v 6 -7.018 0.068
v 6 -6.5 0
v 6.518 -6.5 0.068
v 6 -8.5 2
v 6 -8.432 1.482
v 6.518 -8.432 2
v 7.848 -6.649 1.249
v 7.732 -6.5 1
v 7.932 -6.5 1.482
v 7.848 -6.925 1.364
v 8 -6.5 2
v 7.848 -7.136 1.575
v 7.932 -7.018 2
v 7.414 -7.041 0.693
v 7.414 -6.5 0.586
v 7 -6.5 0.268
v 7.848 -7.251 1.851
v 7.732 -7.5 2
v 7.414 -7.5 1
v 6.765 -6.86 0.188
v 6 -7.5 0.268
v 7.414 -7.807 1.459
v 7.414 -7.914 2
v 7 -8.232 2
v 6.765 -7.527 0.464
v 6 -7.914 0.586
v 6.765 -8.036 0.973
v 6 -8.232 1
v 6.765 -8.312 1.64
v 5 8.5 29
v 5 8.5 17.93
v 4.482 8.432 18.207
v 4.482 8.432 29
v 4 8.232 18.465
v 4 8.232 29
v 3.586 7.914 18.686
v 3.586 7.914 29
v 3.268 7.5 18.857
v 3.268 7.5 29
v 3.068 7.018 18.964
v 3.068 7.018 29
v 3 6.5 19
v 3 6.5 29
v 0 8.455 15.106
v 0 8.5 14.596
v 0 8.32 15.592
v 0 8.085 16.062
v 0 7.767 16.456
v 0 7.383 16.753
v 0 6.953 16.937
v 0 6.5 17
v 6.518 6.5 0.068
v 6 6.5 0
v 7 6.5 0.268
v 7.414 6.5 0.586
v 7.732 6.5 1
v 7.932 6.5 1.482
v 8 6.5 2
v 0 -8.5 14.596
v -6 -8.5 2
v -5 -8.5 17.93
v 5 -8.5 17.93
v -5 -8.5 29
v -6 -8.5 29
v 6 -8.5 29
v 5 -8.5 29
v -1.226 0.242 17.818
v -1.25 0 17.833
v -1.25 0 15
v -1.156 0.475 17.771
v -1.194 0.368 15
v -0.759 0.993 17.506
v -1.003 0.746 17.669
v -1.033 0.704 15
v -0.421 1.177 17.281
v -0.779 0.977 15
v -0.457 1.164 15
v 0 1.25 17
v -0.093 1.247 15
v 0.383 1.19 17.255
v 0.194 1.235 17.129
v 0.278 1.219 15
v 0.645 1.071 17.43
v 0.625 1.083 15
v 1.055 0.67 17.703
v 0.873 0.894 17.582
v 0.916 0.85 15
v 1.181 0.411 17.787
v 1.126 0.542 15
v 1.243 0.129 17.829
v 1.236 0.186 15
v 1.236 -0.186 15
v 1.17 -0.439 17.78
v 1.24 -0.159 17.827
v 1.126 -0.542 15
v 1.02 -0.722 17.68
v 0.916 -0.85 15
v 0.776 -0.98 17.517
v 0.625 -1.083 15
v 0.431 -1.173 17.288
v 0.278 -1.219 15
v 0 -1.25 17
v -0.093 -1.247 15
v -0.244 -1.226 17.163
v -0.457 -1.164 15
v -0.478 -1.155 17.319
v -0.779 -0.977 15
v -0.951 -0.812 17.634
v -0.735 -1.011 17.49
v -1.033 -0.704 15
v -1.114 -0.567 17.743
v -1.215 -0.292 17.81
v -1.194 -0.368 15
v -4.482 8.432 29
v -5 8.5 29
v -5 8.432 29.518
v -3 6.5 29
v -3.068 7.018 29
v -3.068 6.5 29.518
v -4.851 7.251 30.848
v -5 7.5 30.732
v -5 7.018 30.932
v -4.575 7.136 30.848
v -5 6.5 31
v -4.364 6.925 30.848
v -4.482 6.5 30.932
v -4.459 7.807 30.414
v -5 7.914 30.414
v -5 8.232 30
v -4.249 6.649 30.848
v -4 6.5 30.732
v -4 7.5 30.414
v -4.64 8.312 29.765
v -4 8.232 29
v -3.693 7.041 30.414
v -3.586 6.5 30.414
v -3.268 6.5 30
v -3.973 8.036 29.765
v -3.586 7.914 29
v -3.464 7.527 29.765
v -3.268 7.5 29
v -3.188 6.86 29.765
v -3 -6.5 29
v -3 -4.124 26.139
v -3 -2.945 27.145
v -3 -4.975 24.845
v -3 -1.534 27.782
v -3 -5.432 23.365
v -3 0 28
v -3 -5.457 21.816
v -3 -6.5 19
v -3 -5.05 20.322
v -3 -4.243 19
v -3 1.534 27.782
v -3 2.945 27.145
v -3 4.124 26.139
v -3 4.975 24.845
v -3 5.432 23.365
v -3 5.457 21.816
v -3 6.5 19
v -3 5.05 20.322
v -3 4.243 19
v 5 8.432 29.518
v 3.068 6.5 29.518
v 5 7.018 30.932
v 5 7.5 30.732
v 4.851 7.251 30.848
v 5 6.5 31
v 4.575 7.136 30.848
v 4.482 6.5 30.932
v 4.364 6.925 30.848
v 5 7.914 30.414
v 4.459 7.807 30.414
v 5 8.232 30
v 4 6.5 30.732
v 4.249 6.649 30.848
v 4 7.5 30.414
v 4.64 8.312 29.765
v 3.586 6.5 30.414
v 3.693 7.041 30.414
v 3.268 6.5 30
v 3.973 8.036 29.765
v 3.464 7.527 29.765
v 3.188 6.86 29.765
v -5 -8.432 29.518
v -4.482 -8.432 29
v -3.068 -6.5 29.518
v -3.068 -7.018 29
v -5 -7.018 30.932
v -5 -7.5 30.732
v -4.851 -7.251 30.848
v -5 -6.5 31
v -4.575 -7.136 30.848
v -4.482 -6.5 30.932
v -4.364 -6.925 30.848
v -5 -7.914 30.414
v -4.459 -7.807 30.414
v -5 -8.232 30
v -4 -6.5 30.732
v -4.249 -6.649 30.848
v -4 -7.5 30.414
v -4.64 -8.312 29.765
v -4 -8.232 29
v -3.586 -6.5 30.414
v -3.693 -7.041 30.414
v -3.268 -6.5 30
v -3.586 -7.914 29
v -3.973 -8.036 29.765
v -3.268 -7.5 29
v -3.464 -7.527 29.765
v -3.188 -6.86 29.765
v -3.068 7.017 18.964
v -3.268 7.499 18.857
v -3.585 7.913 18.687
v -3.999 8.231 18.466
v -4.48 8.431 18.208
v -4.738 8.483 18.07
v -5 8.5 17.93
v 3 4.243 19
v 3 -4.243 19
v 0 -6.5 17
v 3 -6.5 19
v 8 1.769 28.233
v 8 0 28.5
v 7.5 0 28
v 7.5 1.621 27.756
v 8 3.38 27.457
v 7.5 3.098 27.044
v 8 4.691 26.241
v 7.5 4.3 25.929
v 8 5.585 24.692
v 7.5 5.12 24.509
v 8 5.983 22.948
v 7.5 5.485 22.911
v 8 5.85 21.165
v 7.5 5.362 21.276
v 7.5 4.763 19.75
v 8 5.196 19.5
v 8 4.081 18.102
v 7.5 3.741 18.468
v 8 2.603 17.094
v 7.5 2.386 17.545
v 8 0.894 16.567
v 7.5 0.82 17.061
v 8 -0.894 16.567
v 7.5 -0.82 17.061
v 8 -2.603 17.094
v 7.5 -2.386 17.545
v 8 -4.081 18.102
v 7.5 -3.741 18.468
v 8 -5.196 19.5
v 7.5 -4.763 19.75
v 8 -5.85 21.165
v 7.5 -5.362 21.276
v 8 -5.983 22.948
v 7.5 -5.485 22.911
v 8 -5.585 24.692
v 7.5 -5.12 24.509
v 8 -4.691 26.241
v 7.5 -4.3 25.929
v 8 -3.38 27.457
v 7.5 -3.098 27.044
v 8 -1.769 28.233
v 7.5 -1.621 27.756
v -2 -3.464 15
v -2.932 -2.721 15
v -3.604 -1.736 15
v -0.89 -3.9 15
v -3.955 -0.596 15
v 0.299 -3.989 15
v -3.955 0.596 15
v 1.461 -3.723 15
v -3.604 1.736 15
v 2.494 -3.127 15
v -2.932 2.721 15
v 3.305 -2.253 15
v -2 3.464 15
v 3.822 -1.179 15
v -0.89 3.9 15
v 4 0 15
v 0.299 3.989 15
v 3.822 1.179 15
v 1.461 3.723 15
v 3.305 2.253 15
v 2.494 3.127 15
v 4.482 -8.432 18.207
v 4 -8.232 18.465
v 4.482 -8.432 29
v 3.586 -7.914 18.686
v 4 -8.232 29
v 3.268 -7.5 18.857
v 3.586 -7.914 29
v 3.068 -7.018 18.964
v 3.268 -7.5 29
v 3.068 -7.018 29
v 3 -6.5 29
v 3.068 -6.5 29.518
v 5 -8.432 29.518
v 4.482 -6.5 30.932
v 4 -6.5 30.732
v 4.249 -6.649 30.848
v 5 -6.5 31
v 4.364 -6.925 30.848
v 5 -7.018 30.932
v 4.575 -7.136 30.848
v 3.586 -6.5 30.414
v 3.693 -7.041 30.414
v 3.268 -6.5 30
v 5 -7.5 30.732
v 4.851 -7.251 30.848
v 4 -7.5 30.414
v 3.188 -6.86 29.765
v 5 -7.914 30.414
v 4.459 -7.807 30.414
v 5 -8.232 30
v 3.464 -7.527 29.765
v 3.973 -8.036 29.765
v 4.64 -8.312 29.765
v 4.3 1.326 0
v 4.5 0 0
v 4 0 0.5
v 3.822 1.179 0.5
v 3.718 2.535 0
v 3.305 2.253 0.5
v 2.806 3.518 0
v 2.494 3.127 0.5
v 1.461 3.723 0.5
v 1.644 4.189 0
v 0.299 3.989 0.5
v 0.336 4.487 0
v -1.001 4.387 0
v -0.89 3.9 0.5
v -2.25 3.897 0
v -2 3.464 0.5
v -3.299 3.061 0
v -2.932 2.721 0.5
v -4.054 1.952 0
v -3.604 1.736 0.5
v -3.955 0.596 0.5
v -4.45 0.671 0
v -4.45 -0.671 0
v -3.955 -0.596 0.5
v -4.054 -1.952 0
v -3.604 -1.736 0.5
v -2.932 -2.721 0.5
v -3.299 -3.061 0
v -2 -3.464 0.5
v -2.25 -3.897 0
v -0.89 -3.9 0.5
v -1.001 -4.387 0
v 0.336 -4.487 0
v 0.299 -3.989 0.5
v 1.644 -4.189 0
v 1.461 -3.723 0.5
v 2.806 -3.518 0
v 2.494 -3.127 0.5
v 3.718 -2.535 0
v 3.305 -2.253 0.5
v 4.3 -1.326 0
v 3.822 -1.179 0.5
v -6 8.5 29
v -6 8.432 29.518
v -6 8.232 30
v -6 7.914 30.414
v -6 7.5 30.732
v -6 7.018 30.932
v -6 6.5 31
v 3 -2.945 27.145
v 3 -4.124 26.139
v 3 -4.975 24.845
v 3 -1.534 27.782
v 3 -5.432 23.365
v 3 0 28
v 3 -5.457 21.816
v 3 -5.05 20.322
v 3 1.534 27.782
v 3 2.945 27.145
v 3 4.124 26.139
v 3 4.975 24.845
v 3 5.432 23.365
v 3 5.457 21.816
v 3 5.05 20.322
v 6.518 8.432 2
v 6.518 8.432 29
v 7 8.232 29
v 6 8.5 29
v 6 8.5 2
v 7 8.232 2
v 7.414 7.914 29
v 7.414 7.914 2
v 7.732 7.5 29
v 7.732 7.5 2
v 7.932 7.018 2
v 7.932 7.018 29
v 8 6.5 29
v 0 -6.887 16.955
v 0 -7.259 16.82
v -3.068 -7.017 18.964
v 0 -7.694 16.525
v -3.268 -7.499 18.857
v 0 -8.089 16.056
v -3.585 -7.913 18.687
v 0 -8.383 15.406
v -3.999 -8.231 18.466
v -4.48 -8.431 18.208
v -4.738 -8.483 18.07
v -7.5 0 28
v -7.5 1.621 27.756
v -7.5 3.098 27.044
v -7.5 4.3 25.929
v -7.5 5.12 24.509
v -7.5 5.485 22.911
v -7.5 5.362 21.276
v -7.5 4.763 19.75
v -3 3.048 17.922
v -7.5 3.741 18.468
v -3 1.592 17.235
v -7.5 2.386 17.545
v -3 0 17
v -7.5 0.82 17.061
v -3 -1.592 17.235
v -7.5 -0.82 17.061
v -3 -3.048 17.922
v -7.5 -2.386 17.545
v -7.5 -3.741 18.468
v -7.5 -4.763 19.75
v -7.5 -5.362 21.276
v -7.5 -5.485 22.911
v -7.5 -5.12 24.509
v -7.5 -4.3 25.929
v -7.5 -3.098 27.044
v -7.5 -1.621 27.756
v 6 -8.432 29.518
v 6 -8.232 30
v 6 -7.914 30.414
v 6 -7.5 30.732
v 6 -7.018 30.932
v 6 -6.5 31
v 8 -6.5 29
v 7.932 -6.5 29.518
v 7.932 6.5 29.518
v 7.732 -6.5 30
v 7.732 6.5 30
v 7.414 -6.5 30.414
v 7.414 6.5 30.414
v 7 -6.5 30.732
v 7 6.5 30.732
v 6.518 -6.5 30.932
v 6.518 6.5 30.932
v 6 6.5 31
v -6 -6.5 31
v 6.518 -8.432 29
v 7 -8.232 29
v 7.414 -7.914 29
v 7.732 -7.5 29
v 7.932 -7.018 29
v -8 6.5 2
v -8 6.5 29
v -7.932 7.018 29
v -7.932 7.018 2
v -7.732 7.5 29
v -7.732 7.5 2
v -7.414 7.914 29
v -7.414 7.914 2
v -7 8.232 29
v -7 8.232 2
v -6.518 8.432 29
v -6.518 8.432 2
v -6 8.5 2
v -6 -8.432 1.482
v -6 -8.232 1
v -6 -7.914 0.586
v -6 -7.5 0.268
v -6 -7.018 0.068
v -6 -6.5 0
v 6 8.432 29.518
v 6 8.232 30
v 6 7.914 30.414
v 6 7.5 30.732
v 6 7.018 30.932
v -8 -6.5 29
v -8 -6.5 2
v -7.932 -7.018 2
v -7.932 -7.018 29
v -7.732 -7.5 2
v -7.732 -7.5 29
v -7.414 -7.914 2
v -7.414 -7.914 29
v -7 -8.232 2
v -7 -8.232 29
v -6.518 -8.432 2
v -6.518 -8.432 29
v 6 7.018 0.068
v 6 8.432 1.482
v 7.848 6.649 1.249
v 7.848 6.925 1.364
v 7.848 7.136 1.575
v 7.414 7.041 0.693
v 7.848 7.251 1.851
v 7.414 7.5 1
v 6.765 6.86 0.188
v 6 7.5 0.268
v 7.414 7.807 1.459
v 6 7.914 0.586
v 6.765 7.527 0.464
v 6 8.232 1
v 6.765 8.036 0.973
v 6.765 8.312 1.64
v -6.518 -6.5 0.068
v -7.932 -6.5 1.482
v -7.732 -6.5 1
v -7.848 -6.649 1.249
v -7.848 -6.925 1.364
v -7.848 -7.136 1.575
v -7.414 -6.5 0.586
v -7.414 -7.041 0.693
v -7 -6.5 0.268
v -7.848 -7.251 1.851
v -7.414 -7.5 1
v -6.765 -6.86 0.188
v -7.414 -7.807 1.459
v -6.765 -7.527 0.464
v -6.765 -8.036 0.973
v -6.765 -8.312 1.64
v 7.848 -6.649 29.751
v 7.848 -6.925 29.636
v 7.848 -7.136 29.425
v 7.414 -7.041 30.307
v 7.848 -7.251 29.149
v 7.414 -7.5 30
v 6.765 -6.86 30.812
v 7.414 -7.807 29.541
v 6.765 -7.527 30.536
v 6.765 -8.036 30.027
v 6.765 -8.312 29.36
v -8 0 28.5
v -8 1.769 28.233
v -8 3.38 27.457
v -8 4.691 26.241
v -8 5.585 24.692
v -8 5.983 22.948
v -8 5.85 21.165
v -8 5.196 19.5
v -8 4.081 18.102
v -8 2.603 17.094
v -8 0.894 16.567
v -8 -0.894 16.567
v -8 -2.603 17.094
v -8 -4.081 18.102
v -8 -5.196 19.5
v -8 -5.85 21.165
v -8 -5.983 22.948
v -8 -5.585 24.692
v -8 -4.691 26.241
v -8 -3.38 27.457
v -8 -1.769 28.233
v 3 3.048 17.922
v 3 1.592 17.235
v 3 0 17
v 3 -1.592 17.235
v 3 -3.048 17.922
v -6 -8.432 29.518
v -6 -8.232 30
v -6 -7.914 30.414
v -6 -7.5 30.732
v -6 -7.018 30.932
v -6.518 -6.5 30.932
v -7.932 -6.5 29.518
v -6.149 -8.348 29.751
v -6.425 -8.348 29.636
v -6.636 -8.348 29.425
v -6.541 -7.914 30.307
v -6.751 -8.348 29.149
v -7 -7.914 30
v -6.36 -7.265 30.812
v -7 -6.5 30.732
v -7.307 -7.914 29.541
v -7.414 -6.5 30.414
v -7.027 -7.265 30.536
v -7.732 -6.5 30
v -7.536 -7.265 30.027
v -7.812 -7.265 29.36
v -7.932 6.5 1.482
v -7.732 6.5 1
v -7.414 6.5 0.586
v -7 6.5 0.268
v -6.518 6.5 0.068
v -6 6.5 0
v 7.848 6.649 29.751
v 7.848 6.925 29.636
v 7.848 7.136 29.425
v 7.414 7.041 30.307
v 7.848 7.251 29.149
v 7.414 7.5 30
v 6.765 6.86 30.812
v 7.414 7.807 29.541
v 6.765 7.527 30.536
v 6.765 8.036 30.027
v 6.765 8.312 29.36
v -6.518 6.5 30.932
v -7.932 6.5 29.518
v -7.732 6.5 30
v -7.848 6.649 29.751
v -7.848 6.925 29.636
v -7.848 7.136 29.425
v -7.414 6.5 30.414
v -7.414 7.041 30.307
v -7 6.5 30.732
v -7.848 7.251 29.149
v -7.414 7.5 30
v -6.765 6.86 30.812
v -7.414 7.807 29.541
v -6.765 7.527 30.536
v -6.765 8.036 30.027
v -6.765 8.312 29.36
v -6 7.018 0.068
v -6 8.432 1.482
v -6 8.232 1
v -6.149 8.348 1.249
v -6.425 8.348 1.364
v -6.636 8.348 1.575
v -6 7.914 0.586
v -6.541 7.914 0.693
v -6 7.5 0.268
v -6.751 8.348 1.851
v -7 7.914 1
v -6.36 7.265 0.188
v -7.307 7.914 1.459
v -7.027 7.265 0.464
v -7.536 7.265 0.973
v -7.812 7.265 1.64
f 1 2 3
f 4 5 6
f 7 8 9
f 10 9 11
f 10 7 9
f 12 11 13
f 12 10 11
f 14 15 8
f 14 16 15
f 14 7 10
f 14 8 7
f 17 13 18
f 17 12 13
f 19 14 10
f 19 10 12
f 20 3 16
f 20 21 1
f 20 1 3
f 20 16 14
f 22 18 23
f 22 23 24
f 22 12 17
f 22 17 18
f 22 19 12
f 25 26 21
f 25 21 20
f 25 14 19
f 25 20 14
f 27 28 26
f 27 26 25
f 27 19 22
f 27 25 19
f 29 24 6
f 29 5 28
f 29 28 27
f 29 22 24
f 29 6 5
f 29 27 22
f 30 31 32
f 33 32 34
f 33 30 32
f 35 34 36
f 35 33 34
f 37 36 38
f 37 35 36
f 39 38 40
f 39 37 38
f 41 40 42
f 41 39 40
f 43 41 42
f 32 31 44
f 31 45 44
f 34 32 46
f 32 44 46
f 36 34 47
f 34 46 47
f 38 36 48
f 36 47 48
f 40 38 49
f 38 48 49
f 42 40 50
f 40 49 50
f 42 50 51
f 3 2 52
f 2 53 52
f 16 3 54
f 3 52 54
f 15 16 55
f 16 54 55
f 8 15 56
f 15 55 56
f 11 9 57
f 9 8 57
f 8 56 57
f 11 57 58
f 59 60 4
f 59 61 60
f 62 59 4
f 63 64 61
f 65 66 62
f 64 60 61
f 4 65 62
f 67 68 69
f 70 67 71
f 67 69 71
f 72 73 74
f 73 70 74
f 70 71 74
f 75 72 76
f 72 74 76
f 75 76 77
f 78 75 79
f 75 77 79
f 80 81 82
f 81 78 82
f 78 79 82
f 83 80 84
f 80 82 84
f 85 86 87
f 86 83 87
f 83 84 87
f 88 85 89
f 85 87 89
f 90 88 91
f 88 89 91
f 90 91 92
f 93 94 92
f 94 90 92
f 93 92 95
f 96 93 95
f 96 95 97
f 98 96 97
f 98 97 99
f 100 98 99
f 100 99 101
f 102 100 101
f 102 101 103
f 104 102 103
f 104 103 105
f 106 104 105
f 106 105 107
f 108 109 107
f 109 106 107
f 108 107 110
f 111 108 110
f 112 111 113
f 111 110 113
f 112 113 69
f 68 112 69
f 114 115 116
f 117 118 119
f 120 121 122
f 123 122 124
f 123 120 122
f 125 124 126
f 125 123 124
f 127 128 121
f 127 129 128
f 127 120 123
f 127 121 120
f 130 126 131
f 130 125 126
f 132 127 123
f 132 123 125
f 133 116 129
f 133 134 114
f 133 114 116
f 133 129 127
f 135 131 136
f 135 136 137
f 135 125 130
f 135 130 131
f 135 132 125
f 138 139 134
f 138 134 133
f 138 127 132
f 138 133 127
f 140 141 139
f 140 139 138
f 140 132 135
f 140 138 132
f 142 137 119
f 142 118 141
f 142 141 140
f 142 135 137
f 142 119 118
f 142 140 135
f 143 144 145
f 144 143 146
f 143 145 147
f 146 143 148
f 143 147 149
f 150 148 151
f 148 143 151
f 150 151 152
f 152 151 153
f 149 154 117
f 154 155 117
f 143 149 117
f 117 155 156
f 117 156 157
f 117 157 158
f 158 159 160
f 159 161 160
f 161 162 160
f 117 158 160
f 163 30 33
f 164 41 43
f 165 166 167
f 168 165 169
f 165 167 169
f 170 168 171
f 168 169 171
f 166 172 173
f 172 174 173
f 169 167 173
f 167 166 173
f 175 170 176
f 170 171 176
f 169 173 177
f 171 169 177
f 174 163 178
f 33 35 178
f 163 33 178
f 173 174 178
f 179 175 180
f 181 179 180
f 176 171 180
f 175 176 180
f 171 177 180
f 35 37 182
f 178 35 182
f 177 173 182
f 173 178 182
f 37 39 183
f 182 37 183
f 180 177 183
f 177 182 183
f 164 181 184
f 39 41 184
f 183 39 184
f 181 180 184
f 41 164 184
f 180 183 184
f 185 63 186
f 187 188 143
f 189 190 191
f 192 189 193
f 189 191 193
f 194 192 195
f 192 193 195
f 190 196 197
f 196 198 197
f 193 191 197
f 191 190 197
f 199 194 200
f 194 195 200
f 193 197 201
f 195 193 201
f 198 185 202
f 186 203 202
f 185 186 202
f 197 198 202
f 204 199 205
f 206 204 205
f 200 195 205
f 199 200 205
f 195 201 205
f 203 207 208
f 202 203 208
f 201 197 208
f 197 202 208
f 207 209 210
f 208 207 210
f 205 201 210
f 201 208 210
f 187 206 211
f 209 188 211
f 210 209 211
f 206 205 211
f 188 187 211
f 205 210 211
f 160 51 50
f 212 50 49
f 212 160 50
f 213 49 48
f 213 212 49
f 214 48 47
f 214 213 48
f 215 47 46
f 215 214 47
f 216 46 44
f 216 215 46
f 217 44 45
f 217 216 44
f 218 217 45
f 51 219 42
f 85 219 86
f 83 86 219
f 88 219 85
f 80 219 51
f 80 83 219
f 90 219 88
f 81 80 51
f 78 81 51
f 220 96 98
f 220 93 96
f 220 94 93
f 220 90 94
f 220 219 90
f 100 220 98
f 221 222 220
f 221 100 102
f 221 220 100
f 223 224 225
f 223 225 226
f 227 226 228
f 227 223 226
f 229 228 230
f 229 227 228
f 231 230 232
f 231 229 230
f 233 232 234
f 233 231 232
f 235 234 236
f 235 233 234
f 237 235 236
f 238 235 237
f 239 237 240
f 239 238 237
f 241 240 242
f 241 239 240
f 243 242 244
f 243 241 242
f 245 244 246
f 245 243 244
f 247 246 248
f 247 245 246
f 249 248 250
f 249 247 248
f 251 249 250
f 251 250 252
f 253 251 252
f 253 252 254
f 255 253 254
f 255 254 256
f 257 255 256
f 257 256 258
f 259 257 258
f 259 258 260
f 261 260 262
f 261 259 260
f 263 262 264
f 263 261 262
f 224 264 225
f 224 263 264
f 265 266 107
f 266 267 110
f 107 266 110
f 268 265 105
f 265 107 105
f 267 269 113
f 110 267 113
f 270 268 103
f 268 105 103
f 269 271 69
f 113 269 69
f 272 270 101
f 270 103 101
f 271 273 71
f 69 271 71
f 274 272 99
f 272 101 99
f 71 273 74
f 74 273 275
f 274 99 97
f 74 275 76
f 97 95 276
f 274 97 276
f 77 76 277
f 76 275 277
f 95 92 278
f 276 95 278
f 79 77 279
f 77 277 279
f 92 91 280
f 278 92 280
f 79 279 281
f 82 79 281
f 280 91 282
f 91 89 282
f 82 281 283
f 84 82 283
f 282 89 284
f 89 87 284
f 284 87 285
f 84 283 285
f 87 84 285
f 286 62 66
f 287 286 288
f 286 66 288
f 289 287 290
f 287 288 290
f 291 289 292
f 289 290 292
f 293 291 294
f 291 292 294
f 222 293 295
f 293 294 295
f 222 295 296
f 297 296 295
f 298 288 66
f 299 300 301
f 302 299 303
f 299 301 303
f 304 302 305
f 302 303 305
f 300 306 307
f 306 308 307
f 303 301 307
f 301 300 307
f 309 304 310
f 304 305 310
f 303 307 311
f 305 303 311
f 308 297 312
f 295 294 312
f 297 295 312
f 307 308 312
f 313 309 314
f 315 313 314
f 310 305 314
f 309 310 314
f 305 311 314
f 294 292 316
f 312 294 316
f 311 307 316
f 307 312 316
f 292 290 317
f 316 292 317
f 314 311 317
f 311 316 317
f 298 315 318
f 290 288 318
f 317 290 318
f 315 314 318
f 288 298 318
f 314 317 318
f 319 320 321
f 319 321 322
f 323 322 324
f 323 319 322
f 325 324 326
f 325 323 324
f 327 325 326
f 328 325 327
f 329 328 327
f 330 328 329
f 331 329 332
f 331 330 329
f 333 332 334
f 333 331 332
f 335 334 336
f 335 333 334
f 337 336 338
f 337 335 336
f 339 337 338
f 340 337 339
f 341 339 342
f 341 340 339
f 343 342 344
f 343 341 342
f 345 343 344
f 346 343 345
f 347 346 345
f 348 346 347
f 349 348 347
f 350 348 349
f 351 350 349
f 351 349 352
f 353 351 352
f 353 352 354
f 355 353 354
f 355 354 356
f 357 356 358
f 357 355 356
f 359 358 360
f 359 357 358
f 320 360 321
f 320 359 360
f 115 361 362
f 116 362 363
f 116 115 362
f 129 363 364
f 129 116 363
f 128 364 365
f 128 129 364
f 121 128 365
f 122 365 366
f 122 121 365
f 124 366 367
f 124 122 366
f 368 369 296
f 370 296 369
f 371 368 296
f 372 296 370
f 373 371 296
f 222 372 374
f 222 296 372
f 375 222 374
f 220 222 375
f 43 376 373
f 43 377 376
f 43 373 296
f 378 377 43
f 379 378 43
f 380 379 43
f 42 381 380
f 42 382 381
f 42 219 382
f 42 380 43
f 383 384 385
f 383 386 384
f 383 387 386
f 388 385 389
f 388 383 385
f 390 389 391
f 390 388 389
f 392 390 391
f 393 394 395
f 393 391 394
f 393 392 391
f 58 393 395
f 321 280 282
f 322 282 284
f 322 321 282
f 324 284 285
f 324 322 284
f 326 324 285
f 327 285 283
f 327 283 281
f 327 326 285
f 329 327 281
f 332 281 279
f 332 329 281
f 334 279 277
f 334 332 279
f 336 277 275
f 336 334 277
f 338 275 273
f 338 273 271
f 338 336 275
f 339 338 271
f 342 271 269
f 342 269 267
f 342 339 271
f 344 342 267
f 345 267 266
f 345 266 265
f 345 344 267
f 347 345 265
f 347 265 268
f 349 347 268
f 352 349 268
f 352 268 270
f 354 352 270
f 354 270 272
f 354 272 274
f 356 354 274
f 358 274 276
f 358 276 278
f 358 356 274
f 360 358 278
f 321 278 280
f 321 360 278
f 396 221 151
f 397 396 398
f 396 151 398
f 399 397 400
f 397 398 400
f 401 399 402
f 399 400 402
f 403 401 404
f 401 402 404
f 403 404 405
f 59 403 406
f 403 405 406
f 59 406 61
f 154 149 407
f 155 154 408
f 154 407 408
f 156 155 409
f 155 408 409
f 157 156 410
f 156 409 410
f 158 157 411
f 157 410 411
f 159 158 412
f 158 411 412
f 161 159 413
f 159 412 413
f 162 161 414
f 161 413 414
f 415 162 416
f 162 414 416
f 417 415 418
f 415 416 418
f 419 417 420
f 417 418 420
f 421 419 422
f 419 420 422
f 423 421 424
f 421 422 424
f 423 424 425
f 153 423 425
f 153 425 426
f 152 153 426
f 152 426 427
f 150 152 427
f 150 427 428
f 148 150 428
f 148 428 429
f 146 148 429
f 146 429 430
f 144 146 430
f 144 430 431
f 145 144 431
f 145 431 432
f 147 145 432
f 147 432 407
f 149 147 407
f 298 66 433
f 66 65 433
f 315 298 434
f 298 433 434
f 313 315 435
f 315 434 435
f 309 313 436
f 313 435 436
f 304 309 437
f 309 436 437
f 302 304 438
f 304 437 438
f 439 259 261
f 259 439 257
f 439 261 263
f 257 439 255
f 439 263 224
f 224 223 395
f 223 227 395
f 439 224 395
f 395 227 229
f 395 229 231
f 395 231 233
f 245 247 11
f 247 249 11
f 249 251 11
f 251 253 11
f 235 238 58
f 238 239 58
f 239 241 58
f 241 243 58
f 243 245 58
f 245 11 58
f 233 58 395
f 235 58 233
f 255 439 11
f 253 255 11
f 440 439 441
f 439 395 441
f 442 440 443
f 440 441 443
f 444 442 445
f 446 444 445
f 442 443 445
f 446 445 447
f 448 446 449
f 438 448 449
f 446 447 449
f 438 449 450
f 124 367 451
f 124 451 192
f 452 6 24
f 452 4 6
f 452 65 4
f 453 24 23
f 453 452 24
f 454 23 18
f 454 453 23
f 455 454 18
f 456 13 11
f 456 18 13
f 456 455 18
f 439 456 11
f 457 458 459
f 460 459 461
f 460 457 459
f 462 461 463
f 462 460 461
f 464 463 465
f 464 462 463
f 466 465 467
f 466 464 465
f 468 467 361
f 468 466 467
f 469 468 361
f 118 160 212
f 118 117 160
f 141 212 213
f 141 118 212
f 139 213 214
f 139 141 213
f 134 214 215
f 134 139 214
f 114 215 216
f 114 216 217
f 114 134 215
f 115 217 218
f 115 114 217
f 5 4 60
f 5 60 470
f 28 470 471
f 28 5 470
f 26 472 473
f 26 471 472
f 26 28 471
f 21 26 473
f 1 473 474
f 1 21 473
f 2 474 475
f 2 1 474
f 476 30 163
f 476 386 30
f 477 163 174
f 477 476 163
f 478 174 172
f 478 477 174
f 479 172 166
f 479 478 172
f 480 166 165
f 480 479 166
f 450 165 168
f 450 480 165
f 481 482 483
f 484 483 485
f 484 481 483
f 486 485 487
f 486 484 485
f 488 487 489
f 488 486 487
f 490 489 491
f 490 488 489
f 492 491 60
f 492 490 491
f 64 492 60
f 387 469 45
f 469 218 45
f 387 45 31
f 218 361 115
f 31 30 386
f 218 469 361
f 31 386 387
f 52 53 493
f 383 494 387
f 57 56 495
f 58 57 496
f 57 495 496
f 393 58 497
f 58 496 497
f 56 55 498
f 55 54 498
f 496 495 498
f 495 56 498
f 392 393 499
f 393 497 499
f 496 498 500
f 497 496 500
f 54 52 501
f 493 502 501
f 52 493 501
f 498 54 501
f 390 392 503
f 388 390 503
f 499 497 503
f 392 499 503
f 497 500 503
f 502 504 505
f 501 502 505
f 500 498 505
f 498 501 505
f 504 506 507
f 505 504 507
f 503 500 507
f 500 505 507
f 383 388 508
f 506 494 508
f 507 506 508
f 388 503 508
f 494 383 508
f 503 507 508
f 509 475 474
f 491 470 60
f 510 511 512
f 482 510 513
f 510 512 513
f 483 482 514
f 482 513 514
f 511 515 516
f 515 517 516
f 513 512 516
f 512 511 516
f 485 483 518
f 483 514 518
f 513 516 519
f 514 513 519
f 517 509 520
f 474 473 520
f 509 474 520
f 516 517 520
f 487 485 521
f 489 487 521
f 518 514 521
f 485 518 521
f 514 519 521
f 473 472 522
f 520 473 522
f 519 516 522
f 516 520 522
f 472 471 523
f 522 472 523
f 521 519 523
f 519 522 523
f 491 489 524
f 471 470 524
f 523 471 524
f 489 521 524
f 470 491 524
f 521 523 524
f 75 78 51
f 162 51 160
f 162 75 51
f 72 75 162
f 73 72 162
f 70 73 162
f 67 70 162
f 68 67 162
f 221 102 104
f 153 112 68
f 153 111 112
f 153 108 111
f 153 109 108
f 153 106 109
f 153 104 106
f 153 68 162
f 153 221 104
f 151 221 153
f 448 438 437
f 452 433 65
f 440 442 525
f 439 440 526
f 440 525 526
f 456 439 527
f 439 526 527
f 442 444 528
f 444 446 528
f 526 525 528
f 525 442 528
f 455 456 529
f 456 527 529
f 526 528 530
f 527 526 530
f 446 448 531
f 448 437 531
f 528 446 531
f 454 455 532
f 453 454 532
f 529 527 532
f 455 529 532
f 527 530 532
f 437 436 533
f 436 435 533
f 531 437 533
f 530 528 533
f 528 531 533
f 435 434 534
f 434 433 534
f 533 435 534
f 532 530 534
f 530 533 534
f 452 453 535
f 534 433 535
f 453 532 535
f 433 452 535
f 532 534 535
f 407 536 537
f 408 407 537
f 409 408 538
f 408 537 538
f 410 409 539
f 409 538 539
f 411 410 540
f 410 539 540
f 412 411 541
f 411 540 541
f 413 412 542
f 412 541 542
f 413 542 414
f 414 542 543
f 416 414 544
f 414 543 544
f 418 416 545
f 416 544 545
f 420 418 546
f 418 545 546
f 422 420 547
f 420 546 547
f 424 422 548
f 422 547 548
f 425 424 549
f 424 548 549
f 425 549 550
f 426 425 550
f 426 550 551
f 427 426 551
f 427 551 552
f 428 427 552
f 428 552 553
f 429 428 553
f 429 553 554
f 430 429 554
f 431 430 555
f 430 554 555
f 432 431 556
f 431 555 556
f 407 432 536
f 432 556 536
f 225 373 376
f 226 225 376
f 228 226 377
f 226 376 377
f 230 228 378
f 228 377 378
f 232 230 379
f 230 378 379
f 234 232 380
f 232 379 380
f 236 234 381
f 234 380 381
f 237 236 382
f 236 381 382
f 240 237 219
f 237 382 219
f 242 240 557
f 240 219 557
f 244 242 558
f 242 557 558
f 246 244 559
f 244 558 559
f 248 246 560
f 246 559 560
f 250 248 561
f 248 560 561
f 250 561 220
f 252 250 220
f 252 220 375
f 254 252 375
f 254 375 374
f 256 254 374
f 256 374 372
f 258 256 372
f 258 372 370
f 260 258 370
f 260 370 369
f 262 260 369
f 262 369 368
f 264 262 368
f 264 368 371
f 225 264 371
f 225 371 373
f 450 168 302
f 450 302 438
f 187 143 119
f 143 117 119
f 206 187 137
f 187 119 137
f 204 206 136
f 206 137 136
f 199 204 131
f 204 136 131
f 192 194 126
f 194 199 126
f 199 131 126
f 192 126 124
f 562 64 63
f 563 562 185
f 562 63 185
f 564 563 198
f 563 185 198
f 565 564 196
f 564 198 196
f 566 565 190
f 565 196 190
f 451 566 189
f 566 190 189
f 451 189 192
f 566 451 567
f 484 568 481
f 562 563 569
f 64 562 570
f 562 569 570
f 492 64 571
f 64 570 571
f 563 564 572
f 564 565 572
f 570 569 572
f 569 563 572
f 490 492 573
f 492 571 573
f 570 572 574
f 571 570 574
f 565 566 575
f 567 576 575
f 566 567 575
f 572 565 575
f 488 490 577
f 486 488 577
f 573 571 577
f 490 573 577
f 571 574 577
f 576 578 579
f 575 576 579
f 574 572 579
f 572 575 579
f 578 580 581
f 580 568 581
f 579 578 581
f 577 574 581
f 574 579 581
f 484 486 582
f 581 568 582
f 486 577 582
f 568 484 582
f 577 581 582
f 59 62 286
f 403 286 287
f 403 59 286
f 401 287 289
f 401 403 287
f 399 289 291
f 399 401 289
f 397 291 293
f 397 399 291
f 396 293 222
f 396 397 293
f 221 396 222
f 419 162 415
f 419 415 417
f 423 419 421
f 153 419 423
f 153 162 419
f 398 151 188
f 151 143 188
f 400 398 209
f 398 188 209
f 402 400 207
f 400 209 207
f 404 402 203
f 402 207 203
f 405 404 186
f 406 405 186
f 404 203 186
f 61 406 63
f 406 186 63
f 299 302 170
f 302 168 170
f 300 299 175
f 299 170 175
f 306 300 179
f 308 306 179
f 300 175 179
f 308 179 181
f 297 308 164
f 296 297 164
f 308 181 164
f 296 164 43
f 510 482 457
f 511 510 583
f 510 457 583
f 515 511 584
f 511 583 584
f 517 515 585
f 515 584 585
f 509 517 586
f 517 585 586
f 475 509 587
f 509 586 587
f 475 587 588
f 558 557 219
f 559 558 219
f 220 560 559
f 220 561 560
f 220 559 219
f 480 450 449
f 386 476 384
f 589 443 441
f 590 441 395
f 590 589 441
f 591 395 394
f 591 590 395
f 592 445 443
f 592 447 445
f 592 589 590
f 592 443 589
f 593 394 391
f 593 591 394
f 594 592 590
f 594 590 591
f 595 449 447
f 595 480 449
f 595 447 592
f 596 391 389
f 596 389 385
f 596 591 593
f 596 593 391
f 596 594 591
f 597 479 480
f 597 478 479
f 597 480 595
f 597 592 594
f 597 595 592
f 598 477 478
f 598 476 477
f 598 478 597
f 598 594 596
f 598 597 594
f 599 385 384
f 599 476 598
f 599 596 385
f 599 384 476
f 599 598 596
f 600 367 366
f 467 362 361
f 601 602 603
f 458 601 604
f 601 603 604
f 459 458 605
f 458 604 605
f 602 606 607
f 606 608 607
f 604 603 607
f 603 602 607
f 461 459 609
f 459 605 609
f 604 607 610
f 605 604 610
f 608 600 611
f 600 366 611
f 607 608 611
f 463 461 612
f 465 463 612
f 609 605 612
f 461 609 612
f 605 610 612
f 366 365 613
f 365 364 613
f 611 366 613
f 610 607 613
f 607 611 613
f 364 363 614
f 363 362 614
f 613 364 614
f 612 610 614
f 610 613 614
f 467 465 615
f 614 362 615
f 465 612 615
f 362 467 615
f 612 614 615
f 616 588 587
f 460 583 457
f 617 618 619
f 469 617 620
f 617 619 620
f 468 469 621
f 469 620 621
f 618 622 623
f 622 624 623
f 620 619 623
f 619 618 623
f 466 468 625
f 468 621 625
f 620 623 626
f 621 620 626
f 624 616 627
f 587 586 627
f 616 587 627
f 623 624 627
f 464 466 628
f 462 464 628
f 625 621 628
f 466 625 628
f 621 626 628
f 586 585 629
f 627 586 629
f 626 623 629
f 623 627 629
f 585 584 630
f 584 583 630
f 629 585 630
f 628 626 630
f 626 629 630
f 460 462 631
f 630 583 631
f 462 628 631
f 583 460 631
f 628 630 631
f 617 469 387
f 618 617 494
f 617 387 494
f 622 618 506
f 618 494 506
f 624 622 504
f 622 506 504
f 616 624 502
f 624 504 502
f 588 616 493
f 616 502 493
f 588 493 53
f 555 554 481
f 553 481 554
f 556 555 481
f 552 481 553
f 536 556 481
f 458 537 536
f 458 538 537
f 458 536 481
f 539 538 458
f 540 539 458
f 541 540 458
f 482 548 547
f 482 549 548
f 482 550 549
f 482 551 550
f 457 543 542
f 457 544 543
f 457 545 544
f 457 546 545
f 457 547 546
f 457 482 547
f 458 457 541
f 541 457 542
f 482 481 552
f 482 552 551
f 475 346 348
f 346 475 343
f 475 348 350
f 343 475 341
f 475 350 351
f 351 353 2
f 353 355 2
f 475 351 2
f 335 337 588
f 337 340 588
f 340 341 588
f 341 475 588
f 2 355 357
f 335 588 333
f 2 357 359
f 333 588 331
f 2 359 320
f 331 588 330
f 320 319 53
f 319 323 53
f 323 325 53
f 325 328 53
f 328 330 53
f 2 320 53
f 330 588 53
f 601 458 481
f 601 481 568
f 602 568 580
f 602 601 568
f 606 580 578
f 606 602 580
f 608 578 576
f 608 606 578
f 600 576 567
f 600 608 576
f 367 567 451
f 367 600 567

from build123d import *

# Parameters (mm, degrees)
SKETCH1_W           = 16
SKETCH1_H           = 17
SKETCH1_R           = 4
BOSS_EXTRUDE1_DEPTH = 15
SKETCH2_W           = 5
SKETCH2_H           = 17
BOSS_EXTRUDE2_DEPTH = 16
SKETCH3_R           = 5.5
CUT_EXTRUDE3_DEPTH  = 16
BOSS_EXTRUDE5_DEPTH = 17
SKETCH5_R           = 1.25
CUT_EXTRUDE4_DEPTH  = 17
FILLET1_R           = 2
CHAMFER1_SIZE       = 0.5


with BuildPart() as part:
    # Sketch1 → Boss-Extrude1 (new body)
    with BuildSketch(Plane.XY):
        Rectangle(SKETCH1_W, SKETCH1_H)
        Circle(SKETCH1_R, mode=Mode.SUBTRACT)
    extrude(amount=BOSS_EXTRUDE1_DEPTH)

    # Sketch2 → Boss-Extrude2 (add)
    with BuildSketch(Plane.XY.offset(15)):
        with Locations((-5.5, 0)):
            Rectangle(SKETCH2_W, SKETCH2_H)
        with Locations((5.5, 0)):
            Rectangle(SKETCH2_W, SKETCH2_H)
    extrude(amount=BOSS_EXTRUDE2_DEPTH)

    # Sketch3 → Cut-Extrude3 (cut)
    with BuildSketch(Plane.ZY.offset(8)):
        with Locations((22.5, 0)):
            Circle(SKETCH3_R)
    extrude(amount=-CUT_EXTRUDE3_DEPTH, mode=Mode.SUBTRACT)

    # Sketch4 → Boss-Extrude5 (add, through all)
    with BuildSketch(Plane.XZ.offset(8.5)):
        Polygon((-3, 19), (-3, 15), (0, 15), (3, 15), (3, 19), (0, 17), align=None)
    extrude(amount=-BOSS_EXTRUDE5_DEPTH)

    # Sketch5 → Cut-Extrude4 (cut, through all)
    with BuildSketch(Plane(origin=(0, 0, 15), x_dir=(-1, 0, 0), z_dir=(0, 0, -1))):
        Circle(SKETCH5_R)
    extrude(amount=-CUT_EXTRUDE4_DEPTH, mode=Mode.SUBTRACT)

    # Fillet1
    fillet1_edges = [part.edges().sort_by_distance(p)[0] for p in [
        (-3, 8.5, 25),
        (-3, -8.5, 25),
        (-5.5, 8.5, 31),
        (-8, 0, 31),
        (-5.5, -8.5, 31),
        (-3, 0, 31),
        (3, 8.5, 25),
        (3, -8.5, 25),
        (5.5, 8.5, 31),
        (3, 0, 31),
        (5.5, -8.5, 31),
        (8, 0, 31),
        (0, -8.5, 0),
        (-8, 0, 0),
        (0, 8.5, 0),
        (8, 0, 0),
        (-1.5, 8.5, 18),
        (1.5, 8.5, 18),
        (1.5, -8.5, 18),
        (-1.5, -8.5, 18),
        (8, -8.5, 15.5),
        (-8, -8.5, 15.5),
        (-8, 8.5, 15.5),
        (8, 8.5, 15.5),
    ]]
    fillet(fillet1_edges, radius=FILLET1_R)

    # Chamfer1
    chamfer1_edges = [part.edges().sort_by_distance(p)[0] for p in [
        (-4, 0, 0),
        (8, 0, 17),
        (-8, 0, 17),
    ]]
    chamfer(chamfer1_edges, length=CHAMFER1_SIZE)


solid = part.part
